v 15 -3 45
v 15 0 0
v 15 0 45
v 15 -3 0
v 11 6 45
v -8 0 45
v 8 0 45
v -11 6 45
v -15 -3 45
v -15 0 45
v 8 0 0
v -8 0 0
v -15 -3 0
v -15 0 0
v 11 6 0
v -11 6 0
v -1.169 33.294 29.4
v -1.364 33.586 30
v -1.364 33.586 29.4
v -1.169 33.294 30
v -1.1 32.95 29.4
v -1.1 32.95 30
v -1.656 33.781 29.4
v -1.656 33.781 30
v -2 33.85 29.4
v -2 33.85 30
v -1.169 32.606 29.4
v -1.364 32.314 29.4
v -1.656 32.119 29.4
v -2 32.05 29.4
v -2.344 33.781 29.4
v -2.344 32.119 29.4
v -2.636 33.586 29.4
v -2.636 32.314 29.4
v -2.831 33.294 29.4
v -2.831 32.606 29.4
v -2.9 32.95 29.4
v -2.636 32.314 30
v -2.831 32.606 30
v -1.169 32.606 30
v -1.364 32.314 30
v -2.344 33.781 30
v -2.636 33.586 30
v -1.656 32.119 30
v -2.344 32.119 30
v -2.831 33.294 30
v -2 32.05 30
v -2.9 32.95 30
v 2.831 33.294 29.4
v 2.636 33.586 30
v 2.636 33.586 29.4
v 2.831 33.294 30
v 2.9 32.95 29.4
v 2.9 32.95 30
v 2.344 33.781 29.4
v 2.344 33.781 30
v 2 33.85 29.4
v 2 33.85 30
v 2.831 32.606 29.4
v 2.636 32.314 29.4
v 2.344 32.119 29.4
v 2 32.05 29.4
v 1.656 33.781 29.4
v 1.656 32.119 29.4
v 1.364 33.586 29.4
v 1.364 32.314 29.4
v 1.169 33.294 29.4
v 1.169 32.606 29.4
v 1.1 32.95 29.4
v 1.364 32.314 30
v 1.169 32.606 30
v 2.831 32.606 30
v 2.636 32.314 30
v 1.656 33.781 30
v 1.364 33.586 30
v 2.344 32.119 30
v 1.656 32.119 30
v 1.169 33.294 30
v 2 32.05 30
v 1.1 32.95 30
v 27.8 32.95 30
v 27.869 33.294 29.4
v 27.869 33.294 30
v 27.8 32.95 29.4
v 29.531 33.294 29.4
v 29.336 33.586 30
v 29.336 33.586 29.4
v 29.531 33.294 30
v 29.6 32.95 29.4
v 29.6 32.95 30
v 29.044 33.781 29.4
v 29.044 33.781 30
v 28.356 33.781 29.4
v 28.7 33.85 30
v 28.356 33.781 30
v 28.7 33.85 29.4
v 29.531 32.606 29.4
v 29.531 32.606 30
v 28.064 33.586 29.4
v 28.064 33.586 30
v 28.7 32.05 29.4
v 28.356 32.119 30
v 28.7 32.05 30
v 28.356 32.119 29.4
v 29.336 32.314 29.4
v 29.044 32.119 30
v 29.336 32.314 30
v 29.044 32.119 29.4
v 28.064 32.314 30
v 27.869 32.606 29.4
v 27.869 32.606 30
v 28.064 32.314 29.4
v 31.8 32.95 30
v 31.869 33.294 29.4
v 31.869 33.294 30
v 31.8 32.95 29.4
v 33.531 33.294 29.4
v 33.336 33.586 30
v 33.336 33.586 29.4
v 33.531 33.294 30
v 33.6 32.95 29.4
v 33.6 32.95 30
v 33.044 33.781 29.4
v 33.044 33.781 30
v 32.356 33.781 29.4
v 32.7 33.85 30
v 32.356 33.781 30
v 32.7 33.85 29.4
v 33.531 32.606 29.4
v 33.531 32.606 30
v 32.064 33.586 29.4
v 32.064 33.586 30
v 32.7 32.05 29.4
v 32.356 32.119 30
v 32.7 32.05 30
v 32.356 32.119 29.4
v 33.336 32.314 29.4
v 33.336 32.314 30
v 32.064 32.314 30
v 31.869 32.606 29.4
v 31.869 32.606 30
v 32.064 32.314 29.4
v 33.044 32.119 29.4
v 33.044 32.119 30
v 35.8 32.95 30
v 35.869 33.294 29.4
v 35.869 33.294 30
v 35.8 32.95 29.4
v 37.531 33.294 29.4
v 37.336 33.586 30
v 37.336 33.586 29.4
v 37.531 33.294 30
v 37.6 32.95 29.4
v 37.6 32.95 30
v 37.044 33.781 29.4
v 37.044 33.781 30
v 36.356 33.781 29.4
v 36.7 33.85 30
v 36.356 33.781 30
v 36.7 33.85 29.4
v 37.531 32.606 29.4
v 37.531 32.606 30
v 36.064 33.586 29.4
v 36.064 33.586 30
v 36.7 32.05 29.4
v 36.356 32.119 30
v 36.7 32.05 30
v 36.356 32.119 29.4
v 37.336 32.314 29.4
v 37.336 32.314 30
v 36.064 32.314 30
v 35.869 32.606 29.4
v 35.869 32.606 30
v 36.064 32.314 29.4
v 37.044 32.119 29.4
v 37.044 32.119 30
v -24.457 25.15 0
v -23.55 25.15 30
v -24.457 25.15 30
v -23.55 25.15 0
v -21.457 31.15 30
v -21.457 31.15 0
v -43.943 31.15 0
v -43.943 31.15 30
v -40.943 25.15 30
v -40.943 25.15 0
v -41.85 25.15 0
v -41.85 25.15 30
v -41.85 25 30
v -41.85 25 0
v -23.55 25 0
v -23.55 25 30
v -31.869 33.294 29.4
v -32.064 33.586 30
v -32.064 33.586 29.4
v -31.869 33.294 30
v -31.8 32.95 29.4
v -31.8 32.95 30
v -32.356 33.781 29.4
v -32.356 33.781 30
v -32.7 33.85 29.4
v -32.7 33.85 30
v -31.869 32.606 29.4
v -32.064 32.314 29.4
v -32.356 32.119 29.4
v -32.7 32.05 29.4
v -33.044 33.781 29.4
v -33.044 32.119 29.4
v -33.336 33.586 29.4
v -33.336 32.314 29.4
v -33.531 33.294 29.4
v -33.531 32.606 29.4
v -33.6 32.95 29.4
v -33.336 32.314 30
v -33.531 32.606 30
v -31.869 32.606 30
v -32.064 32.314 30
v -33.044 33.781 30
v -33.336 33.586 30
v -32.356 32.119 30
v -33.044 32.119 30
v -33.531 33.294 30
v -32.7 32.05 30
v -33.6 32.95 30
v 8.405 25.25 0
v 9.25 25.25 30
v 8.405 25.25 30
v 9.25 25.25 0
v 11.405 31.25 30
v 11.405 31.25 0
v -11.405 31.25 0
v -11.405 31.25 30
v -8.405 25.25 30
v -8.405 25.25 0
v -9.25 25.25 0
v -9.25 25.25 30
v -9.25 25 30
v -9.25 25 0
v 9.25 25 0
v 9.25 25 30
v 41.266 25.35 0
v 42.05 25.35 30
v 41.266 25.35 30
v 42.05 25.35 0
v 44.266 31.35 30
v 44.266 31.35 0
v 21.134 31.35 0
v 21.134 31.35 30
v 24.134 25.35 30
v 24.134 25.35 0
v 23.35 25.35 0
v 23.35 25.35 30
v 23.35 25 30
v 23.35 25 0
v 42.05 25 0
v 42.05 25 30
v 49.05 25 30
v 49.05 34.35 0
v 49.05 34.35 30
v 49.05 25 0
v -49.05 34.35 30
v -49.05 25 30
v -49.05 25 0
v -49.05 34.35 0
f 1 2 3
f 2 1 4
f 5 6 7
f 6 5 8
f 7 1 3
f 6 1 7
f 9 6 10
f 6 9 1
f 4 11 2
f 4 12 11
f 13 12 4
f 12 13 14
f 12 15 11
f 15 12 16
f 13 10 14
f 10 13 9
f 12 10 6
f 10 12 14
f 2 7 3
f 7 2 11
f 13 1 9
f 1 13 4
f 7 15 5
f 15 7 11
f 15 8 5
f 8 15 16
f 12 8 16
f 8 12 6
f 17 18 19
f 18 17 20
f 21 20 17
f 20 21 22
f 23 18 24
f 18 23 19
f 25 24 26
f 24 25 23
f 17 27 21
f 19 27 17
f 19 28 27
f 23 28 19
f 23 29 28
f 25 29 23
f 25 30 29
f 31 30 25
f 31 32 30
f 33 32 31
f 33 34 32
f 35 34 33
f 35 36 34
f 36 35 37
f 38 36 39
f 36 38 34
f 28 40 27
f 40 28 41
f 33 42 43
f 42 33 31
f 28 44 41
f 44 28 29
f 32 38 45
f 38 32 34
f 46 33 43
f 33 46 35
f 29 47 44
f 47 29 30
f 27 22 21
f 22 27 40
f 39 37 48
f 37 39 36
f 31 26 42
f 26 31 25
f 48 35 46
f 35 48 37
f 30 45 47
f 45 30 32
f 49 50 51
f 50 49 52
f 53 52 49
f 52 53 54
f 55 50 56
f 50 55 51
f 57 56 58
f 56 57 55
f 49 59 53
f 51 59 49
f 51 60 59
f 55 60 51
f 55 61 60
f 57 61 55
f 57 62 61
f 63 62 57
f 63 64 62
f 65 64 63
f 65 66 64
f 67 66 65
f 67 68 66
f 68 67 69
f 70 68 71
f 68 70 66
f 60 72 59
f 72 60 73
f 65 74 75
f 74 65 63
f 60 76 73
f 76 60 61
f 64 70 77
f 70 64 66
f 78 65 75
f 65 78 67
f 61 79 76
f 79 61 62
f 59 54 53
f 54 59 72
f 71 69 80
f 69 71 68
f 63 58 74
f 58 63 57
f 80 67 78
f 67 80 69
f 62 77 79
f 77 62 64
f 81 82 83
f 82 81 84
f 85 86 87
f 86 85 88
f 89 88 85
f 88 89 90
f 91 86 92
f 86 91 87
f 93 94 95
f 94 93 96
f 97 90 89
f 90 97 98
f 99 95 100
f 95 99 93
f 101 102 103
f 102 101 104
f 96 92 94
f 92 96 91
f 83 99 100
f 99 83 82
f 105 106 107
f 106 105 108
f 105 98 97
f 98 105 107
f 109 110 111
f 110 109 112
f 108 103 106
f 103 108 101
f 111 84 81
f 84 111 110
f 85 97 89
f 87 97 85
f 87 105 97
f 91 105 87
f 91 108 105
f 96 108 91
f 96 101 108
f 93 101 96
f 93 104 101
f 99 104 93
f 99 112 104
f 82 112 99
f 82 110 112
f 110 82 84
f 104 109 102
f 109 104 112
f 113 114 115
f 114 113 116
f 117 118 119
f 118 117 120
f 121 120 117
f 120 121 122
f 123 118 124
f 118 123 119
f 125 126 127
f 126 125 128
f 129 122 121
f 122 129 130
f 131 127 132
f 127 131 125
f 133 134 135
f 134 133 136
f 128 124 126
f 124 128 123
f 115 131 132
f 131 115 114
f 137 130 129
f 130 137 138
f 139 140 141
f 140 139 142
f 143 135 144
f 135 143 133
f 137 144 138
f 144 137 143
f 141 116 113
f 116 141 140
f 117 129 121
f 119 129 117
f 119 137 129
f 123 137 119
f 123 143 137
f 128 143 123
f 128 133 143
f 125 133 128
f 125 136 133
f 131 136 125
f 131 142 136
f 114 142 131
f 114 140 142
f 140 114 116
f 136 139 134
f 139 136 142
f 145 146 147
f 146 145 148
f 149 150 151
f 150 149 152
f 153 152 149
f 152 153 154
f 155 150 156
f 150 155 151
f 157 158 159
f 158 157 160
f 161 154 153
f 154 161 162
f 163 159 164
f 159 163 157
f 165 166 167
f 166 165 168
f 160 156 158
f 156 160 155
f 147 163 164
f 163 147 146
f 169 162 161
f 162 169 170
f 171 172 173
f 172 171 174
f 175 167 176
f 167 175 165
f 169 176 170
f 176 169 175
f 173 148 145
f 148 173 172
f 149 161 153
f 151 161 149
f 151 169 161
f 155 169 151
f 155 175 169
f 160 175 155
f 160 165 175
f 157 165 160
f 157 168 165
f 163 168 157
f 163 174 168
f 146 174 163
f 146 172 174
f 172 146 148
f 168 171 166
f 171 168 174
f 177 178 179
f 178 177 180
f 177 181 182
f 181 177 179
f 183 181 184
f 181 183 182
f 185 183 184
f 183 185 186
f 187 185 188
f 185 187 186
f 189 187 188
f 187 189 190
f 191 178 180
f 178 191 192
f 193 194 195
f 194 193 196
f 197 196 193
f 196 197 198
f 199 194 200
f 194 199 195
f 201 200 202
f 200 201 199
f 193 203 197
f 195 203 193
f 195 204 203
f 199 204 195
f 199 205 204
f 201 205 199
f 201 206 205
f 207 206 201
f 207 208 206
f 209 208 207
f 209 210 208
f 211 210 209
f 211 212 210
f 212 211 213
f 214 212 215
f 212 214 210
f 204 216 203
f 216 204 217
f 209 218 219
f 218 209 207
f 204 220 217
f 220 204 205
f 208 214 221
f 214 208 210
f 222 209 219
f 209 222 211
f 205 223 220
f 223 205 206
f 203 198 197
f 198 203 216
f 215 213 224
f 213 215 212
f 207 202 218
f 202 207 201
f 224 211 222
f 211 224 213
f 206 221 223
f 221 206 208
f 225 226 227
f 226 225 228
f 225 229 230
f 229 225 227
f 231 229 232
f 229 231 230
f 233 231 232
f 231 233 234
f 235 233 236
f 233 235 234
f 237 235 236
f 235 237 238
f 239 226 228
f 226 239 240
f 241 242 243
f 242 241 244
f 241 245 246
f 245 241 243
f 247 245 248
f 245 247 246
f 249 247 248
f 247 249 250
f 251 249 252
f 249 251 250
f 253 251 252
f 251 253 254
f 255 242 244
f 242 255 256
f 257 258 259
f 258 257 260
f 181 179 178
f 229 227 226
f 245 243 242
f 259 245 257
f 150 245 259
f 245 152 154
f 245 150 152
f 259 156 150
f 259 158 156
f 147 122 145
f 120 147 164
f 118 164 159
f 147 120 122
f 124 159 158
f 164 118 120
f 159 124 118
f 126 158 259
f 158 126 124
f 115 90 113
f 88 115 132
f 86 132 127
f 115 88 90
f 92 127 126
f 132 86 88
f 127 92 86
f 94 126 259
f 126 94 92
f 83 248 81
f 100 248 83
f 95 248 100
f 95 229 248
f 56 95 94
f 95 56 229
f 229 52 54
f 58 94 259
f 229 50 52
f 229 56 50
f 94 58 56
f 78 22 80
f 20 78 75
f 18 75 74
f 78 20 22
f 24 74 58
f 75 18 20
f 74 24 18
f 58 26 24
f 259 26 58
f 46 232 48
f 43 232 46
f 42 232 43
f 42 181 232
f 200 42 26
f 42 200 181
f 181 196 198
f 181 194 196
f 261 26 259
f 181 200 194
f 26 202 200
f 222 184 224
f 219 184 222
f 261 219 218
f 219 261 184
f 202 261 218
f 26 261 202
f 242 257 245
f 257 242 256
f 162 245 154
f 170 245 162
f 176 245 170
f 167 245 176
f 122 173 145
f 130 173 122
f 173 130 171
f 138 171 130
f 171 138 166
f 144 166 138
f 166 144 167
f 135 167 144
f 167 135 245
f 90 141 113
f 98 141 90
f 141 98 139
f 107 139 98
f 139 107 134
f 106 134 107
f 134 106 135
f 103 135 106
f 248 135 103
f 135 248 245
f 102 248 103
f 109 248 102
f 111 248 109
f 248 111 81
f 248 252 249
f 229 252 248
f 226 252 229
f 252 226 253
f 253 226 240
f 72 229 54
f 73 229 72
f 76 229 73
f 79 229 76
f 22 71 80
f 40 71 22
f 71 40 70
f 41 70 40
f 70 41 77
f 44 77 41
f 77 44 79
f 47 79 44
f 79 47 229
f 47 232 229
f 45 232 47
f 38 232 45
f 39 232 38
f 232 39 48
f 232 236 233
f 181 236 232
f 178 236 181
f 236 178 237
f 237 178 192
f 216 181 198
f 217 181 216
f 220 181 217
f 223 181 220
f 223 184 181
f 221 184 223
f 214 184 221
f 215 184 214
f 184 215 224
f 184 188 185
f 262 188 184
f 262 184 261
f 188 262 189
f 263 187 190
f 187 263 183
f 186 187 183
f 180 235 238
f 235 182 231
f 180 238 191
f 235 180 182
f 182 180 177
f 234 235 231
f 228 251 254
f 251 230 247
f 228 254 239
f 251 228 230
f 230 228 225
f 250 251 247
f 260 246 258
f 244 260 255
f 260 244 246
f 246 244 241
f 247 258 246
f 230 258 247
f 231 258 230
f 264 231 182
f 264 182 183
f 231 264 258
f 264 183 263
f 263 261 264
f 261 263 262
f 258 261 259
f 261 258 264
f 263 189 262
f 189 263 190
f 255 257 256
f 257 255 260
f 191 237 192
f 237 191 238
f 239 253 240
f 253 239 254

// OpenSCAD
// Dovetail fit test for the bunk rail system. Print both parts, then try
// the tail in each of the three sockets.
//
//   1 dot  = 0.15 clearance (tightest)
//   2 dots = 0.25 (the default)
//   3 dots = 0.35 (loosest)
//
// Pick the tightest socket the tail slides fully into by hand without
// forcing, and that doesn't rattle. Set dt_clear in each accessory to that
// value. Both parts print upright as modeled, no supports.

use <rail-clip.scad>

part = "both"; // [both, tail, sockets]
clears = [0.15, 0.25, 0.35];
h = 30;

module tail_piece() {
  // plate with a long tail, grip tab above the tail so it can be pulled out
  translate([-15, -3, 0]) cube([30, 3, h + 15]);
  dt_tail(0, h + 15);
}

module socket_piece() {
  bw = dt_block_w(0.35);
  pitch = bw + 4;
  difference() {
    translate([-pitch * 1.5, 0, 0]) cube([pitch * 3, dt_block_d(0.35), h]);
    for (i = [0 : 2]) {
      x = (i - 1) * pitch;
      translate([x, 0, -1]) dt_socket(0, h + 2, clears[i]);
      // dots on the top face, between this socket and the back face
      for (k = [0 : i]) translate([x + (k - i / 2) * 4, dt_block_d(0.35) - 1.4, h - 0.6])
        cylinder(d = 1.8, h = 1, $fn = 16);
    }
  }
}

if (part == "tail") tail_piece();
else if (part == "sockets") socket_piece();
else { tail_piece(); translate([0, 25, 0]) socket_piece(); }
